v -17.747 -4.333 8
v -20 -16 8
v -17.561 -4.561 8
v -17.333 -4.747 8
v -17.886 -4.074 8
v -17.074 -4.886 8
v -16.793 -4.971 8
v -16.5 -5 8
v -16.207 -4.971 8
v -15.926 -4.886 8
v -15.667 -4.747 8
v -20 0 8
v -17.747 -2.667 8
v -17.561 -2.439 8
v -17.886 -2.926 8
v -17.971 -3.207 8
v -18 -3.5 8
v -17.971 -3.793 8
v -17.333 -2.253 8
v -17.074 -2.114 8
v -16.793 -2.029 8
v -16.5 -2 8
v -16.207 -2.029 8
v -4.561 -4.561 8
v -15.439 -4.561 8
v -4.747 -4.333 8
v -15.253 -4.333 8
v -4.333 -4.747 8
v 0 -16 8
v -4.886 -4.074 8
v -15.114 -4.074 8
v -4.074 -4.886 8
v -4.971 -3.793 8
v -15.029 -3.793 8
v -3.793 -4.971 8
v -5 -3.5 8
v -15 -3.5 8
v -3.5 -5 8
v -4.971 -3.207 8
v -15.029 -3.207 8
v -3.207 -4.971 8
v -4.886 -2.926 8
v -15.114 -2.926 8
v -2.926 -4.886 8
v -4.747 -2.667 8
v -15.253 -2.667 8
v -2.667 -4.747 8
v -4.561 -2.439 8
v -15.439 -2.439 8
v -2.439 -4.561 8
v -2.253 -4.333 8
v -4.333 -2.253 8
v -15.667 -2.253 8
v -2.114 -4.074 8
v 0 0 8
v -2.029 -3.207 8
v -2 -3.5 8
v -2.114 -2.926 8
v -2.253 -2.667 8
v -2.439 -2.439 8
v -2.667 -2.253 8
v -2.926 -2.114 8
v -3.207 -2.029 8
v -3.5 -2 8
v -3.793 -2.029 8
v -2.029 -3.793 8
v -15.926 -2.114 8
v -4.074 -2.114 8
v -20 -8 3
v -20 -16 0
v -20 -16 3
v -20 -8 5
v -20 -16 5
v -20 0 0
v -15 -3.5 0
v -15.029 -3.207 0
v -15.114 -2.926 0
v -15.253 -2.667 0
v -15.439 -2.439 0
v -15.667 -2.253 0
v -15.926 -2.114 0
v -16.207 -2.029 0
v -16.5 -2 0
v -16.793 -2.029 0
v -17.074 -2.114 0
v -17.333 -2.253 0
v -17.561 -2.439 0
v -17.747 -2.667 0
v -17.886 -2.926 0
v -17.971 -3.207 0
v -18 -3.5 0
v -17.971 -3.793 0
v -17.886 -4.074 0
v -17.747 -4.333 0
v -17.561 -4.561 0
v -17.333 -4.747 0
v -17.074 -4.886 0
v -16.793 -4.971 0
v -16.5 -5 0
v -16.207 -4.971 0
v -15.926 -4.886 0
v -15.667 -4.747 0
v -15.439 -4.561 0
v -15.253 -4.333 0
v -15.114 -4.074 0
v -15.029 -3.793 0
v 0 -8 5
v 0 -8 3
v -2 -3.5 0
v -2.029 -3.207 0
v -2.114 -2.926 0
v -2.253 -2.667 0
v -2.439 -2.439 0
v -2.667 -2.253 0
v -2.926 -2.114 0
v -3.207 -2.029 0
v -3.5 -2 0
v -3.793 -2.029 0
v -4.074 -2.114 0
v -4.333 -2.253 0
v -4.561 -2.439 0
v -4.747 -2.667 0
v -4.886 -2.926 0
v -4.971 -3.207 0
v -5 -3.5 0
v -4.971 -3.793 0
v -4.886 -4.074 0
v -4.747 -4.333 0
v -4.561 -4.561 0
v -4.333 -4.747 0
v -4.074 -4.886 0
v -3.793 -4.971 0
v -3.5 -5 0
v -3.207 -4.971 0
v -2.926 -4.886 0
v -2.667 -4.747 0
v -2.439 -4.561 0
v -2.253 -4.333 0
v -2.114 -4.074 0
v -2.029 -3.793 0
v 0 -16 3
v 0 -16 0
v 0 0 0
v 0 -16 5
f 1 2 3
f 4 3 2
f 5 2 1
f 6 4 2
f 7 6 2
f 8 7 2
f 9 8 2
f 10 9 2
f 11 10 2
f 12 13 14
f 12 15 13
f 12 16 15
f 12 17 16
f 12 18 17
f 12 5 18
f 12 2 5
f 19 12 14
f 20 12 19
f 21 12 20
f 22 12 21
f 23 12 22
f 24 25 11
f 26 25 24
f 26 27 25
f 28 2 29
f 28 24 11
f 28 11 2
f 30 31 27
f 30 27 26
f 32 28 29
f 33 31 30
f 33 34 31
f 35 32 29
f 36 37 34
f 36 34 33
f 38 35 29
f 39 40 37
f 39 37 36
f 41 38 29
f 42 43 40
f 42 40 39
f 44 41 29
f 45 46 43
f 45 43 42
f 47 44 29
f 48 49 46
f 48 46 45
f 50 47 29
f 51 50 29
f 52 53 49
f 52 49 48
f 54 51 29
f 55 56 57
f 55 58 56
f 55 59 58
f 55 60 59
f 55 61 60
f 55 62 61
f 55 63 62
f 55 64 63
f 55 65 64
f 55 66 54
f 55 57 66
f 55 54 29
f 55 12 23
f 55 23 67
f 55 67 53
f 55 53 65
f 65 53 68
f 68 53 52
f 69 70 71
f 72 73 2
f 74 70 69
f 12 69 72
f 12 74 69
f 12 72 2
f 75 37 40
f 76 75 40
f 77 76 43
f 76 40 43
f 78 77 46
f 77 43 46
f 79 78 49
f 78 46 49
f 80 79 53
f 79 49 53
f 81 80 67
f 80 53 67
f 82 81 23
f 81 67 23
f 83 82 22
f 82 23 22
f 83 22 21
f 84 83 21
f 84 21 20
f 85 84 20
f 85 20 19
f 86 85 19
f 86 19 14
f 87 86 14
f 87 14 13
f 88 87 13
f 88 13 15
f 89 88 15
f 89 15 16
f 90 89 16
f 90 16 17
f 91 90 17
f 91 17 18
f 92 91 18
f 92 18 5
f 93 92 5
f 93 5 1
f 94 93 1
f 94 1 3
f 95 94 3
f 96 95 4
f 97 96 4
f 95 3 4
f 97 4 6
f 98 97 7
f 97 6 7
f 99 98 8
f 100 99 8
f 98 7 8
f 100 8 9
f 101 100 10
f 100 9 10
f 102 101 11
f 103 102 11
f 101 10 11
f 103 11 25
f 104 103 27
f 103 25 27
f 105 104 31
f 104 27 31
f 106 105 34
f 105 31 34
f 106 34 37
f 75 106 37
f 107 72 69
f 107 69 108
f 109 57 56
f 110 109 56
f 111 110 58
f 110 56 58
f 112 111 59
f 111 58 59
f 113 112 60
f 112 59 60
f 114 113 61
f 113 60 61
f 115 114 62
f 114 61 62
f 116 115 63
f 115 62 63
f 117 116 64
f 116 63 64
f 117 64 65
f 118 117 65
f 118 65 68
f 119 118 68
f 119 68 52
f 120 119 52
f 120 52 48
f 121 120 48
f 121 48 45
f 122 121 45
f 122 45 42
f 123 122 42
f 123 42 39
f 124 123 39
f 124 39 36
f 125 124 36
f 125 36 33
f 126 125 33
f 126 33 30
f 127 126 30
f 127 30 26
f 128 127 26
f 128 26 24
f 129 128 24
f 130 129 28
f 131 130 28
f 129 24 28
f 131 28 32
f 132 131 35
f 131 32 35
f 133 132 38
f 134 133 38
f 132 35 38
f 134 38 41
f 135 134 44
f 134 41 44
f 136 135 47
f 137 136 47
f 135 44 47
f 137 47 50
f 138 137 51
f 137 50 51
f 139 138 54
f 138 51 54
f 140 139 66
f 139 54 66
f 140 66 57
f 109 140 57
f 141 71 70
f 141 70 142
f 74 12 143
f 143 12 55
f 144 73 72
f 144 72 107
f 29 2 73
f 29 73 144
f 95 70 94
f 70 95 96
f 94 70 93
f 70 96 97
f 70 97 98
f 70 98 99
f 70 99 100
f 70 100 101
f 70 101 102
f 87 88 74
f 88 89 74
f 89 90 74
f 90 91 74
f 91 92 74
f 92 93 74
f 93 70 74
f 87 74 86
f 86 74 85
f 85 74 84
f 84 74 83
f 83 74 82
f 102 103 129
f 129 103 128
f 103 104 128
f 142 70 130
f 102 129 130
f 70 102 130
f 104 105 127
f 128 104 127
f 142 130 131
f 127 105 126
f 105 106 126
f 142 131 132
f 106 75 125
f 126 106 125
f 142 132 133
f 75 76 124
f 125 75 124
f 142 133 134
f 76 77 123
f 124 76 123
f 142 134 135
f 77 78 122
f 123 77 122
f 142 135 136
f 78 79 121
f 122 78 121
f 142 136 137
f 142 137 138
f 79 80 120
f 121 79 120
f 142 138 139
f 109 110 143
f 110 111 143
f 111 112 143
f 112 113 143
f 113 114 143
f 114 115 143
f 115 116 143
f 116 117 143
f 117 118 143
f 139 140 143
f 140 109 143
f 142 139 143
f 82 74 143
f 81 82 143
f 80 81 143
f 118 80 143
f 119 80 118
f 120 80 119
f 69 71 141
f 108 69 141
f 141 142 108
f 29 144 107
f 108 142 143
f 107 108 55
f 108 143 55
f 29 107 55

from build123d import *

# Parameters (mm, degrees)
F0_W     = 20
F0_H     = 8
F1_DEPTH = 16
F2_W     = 20
F2_H     = 2
F3_DEPTH = 8
F4_R     = 1.5
F5_DEPTH = 25


with BuildPart() as f1:
    # F0 (on Front) → F1 (new body)
    with BuildSketch(Plane.XZ):
        with Locations((-10, 4)):
            Rectangle(F0_W, F0_H)
    extrude(amount=F1_DEPTH)

    # F2 (on face) → F3 (cut)
    with BuildSketch(Plane.XZ.offset(16)):
        with Locations((-10, 4)):
            Rectangle(F2_W, F2_H)
    extrude(amount=-F3_DEPTH, mode=Mode.SUBTRACT)

    # F4 (on face) → F5 (cut)
    with BuildSketch(Plane.XY.offset(8)):
        with Locations((-16.5, -3.5)):
            Circle(F4_R)
        with Locations((-3.5, -3.5)):
            Circle(F4_R)
    extrude(amount=-F5_DEPTH, mode=Mode.SUBTRACT)


solid = f1.part
